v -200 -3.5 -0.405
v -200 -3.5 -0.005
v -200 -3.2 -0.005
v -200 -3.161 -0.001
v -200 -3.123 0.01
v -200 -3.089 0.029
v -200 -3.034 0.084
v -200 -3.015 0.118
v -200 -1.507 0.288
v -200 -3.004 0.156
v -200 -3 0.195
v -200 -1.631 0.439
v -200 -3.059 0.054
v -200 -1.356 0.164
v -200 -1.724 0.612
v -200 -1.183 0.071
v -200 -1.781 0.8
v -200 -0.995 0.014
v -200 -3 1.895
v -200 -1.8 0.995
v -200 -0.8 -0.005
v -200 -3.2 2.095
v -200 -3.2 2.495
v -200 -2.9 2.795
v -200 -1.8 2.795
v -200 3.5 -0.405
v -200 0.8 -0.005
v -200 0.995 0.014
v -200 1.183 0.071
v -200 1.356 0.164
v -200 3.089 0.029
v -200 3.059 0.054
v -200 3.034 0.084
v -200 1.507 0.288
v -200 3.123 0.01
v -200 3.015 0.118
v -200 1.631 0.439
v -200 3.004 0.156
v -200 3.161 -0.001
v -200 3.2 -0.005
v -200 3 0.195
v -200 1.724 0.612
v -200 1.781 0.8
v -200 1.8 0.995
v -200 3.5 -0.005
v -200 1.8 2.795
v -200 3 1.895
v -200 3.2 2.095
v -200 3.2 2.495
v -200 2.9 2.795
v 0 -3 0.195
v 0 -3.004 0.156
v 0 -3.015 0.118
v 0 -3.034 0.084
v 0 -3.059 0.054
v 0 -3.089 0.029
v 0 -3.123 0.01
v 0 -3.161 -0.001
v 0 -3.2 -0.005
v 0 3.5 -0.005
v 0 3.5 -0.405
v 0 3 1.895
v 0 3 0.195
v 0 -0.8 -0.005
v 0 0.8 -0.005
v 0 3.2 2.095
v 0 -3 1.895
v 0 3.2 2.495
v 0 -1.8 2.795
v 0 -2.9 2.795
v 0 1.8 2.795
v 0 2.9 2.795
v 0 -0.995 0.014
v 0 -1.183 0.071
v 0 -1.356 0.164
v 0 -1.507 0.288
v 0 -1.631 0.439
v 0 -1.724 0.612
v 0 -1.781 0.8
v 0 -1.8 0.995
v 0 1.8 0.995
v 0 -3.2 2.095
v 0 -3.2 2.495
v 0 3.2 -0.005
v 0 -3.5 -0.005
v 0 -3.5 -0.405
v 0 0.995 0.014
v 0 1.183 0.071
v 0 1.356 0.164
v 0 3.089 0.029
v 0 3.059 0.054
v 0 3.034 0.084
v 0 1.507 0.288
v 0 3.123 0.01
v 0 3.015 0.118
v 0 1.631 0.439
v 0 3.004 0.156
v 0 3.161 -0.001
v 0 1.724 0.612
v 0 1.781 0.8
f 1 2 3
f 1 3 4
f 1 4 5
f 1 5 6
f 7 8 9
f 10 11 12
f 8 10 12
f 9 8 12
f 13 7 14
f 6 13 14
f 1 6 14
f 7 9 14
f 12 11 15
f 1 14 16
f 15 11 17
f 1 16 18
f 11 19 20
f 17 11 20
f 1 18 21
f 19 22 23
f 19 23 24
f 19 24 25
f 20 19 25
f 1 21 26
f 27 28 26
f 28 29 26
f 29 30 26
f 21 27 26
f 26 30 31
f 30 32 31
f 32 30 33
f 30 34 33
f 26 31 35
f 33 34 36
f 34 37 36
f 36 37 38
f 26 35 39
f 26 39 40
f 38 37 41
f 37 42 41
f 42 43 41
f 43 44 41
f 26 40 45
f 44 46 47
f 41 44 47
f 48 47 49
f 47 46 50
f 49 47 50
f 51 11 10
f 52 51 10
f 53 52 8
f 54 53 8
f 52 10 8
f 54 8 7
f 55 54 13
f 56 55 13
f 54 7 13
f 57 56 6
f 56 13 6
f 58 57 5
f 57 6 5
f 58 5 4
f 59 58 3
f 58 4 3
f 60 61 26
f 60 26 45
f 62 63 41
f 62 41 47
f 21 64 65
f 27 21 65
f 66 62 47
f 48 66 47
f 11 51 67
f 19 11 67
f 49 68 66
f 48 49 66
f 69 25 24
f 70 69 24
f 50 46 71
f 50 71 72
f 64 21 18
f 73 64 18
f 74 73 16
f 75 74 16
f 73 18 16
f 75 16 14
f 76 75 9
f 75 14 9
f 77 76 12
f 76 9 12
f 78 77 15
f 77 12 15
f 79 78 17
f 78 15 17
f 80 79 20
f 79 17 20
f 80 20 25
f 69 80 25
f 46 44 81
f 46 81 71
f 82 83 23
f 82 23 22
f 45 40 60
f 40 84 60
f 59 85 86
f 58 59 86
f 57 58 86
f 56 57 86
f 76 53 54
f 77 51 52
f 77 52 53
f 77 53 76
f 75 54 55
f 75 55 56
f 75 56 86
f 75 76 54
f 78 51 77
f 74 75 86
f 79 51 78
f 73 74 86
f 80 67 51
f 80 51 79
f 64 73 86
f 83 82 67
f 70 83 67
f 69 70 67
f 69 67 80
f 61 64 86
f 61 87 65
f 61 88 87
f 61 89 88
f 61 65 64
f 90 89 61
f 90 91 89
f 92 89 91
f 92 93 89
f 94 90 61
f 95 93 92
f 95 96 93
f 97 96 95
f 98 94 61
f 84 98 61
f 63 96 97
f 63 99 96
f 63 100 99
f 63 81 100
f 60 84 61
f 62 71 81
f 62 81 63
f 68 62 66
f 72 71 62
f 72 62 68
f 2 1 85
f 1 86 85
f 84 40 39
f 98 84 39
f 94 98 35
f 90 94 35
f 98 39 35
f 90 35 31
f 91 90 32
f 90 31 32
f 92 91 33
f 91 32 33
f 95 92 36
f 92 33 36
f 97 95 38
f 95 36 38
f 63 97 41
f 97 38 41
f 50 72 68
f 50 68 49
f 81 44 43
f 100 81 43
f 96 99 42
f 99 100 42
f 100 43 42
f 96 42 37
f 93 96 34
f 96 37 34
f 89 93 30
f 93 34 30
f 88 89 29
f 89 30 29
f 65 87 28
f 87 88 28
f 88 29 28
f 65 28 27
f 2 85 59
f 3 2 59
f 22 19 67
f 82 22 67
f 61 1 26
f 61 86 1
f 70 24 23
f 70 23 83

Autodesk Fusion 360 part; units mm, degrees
sketch "Sketch1" plane through (0, 0, 0) normal (1, 0, 0) x (0, 1, 0) in component "Cover"
sketch "Sketch2" plane through (0, 0, 0) normal (1, 0, 0) x (0, 1, 0) in component "Cover"
  line L0 (-3.5, -0.405) -> (3.5, -0.405)
  line L1 (-3.5, -0.405) -> (-3.5, -0.005)
  line L2 (3.5, -0.405) -> (3.5, -0.005)
  line L3 (-3, -0.005) -> (-3, 1.895)
  line L4 (3, -0.005) -> (3, 1.895)
  line L5 (-1.8, -0.005) -> (-1.8, 1.895)
  line L6 (1.8, -0.005) -> (1.8, 1.895)
  line L7 (-1.8, 1.895) -> (-1.8, 2.795)
  line L8 (1.8, 1.895) -> (1.8, 2.795)
  line L9 (-1.8, 2.795) -> (-3.2, 2.795)
  line L10 (1.8, 2.795) -> (3.2, 2.795)
  line L11 (-3, 1.895) -> (-3.2, 1.895)
  line L12 (3, 1.895) -> (3.2, 1.895)
  line L13 (-3.2, 2.795) -> (-3.2, 1.895)
  line L14 (3.2, 2.795) -> (3.2, 1.895)
  line L15 (-3.5, -0.005) -> (-3, -0.005)
  line L16 (-1.8, -0.005) -> (1.8, -0.005)
  line L17 (3, -0.005) -> (3.5, -0.005)
  dimension "d6" = 7
  dimension "d10" = 0.4
  dimension "d12" = 0.4
  dimension "d13" = 3
  dimension "d14" = 3
  dimension "d17" = 1.9
  dimension "d18" = 1.9
  dimension "d20" = 1.2
  dimension "d21" = 1.2
  dimension "d25" = 1.4
  dimension "d26" = 0.2
  dimension "d39" = 2.8
  dimension "d40" = 0.005
  dimension "d41" = 3.5
extrude "Extrude1" add sketch "Sketch2" against normal blind 200 in component "Cover"
fillet "Fillet1" radius 1 1 edges at (-100, 1.8, -0.005) in component "Cover"
fillet "Fillet2" radius 1 1 edges at (-100, -1.8, -0.005) in component "Cover"
chamfer "Chamfer1" distance 0.2 angle 45 1 edges at (-100, 3.2, 1.895) in component "Cover"
chamfer "Chamfer2" distance 0.2 angle 45 1 edges at (-100, -3.2, 1.895) in component "Cover"
fillet "Fillet3" radius 0.2 1 edges at (-100, -3, -0.005) in component "Cover"
fillet "Fillet4" radius 0.2 1 edges at (-100, 3, -0.005) in component "Cover"
chamfer "Chamfer3" distance 0.3 angle 45 2 edges at (-100, -3.2, 2.795) (-100, 3.2, 2.795) in component "Cover"
component "Cover" placed x (1, 0, 0) y (0, 1, 0) z (0, 0, 1) at (0, 0, 0)
equation "width_bottom = 7 mm"
equation "Bottom_radius = 0.2 mm"
equation "radius_inside = 1 mm"
equation "chamfer_inside = 0.2 mm"
equation "length = 200 mm"
equation "d6 = width_bottom"
equation "layer_height = 0.2 mm"
equation "d10 = num_layer_bottom * layer_height"
equation "num_layer_bottom = 2"
equation "d12 = num_layer_bottom * layer_height"
equation "height_below_chamfer = 1.9 mm"
equation "chamfe_angle = 60 deg"
equation "d17 = height_below_chamfer"
equation "d18 = height_below_chamfer"
equation "wall_width = 1.2 mm"
equation "d20 = wall_width"
equation "d21 = wall_width"
equation "overhang = 0.2 mm"
equation "height_overall = 2.8 mm"
equation "d25 = wall_width + overhang"
equation "d26 = overhang"
equation "d27 = -length"
equation "d30 = radius_inside"
equation "d32 = radius_inside"
equation "d33 = chamfer_inside"
equation "d34 = chamfer_inside"
equation "d36 = Bottom_radius"
equation "d38 = Bottom_radius"
equation "d39 = height_overall"
equation "d41 = width_bottom / 2"
